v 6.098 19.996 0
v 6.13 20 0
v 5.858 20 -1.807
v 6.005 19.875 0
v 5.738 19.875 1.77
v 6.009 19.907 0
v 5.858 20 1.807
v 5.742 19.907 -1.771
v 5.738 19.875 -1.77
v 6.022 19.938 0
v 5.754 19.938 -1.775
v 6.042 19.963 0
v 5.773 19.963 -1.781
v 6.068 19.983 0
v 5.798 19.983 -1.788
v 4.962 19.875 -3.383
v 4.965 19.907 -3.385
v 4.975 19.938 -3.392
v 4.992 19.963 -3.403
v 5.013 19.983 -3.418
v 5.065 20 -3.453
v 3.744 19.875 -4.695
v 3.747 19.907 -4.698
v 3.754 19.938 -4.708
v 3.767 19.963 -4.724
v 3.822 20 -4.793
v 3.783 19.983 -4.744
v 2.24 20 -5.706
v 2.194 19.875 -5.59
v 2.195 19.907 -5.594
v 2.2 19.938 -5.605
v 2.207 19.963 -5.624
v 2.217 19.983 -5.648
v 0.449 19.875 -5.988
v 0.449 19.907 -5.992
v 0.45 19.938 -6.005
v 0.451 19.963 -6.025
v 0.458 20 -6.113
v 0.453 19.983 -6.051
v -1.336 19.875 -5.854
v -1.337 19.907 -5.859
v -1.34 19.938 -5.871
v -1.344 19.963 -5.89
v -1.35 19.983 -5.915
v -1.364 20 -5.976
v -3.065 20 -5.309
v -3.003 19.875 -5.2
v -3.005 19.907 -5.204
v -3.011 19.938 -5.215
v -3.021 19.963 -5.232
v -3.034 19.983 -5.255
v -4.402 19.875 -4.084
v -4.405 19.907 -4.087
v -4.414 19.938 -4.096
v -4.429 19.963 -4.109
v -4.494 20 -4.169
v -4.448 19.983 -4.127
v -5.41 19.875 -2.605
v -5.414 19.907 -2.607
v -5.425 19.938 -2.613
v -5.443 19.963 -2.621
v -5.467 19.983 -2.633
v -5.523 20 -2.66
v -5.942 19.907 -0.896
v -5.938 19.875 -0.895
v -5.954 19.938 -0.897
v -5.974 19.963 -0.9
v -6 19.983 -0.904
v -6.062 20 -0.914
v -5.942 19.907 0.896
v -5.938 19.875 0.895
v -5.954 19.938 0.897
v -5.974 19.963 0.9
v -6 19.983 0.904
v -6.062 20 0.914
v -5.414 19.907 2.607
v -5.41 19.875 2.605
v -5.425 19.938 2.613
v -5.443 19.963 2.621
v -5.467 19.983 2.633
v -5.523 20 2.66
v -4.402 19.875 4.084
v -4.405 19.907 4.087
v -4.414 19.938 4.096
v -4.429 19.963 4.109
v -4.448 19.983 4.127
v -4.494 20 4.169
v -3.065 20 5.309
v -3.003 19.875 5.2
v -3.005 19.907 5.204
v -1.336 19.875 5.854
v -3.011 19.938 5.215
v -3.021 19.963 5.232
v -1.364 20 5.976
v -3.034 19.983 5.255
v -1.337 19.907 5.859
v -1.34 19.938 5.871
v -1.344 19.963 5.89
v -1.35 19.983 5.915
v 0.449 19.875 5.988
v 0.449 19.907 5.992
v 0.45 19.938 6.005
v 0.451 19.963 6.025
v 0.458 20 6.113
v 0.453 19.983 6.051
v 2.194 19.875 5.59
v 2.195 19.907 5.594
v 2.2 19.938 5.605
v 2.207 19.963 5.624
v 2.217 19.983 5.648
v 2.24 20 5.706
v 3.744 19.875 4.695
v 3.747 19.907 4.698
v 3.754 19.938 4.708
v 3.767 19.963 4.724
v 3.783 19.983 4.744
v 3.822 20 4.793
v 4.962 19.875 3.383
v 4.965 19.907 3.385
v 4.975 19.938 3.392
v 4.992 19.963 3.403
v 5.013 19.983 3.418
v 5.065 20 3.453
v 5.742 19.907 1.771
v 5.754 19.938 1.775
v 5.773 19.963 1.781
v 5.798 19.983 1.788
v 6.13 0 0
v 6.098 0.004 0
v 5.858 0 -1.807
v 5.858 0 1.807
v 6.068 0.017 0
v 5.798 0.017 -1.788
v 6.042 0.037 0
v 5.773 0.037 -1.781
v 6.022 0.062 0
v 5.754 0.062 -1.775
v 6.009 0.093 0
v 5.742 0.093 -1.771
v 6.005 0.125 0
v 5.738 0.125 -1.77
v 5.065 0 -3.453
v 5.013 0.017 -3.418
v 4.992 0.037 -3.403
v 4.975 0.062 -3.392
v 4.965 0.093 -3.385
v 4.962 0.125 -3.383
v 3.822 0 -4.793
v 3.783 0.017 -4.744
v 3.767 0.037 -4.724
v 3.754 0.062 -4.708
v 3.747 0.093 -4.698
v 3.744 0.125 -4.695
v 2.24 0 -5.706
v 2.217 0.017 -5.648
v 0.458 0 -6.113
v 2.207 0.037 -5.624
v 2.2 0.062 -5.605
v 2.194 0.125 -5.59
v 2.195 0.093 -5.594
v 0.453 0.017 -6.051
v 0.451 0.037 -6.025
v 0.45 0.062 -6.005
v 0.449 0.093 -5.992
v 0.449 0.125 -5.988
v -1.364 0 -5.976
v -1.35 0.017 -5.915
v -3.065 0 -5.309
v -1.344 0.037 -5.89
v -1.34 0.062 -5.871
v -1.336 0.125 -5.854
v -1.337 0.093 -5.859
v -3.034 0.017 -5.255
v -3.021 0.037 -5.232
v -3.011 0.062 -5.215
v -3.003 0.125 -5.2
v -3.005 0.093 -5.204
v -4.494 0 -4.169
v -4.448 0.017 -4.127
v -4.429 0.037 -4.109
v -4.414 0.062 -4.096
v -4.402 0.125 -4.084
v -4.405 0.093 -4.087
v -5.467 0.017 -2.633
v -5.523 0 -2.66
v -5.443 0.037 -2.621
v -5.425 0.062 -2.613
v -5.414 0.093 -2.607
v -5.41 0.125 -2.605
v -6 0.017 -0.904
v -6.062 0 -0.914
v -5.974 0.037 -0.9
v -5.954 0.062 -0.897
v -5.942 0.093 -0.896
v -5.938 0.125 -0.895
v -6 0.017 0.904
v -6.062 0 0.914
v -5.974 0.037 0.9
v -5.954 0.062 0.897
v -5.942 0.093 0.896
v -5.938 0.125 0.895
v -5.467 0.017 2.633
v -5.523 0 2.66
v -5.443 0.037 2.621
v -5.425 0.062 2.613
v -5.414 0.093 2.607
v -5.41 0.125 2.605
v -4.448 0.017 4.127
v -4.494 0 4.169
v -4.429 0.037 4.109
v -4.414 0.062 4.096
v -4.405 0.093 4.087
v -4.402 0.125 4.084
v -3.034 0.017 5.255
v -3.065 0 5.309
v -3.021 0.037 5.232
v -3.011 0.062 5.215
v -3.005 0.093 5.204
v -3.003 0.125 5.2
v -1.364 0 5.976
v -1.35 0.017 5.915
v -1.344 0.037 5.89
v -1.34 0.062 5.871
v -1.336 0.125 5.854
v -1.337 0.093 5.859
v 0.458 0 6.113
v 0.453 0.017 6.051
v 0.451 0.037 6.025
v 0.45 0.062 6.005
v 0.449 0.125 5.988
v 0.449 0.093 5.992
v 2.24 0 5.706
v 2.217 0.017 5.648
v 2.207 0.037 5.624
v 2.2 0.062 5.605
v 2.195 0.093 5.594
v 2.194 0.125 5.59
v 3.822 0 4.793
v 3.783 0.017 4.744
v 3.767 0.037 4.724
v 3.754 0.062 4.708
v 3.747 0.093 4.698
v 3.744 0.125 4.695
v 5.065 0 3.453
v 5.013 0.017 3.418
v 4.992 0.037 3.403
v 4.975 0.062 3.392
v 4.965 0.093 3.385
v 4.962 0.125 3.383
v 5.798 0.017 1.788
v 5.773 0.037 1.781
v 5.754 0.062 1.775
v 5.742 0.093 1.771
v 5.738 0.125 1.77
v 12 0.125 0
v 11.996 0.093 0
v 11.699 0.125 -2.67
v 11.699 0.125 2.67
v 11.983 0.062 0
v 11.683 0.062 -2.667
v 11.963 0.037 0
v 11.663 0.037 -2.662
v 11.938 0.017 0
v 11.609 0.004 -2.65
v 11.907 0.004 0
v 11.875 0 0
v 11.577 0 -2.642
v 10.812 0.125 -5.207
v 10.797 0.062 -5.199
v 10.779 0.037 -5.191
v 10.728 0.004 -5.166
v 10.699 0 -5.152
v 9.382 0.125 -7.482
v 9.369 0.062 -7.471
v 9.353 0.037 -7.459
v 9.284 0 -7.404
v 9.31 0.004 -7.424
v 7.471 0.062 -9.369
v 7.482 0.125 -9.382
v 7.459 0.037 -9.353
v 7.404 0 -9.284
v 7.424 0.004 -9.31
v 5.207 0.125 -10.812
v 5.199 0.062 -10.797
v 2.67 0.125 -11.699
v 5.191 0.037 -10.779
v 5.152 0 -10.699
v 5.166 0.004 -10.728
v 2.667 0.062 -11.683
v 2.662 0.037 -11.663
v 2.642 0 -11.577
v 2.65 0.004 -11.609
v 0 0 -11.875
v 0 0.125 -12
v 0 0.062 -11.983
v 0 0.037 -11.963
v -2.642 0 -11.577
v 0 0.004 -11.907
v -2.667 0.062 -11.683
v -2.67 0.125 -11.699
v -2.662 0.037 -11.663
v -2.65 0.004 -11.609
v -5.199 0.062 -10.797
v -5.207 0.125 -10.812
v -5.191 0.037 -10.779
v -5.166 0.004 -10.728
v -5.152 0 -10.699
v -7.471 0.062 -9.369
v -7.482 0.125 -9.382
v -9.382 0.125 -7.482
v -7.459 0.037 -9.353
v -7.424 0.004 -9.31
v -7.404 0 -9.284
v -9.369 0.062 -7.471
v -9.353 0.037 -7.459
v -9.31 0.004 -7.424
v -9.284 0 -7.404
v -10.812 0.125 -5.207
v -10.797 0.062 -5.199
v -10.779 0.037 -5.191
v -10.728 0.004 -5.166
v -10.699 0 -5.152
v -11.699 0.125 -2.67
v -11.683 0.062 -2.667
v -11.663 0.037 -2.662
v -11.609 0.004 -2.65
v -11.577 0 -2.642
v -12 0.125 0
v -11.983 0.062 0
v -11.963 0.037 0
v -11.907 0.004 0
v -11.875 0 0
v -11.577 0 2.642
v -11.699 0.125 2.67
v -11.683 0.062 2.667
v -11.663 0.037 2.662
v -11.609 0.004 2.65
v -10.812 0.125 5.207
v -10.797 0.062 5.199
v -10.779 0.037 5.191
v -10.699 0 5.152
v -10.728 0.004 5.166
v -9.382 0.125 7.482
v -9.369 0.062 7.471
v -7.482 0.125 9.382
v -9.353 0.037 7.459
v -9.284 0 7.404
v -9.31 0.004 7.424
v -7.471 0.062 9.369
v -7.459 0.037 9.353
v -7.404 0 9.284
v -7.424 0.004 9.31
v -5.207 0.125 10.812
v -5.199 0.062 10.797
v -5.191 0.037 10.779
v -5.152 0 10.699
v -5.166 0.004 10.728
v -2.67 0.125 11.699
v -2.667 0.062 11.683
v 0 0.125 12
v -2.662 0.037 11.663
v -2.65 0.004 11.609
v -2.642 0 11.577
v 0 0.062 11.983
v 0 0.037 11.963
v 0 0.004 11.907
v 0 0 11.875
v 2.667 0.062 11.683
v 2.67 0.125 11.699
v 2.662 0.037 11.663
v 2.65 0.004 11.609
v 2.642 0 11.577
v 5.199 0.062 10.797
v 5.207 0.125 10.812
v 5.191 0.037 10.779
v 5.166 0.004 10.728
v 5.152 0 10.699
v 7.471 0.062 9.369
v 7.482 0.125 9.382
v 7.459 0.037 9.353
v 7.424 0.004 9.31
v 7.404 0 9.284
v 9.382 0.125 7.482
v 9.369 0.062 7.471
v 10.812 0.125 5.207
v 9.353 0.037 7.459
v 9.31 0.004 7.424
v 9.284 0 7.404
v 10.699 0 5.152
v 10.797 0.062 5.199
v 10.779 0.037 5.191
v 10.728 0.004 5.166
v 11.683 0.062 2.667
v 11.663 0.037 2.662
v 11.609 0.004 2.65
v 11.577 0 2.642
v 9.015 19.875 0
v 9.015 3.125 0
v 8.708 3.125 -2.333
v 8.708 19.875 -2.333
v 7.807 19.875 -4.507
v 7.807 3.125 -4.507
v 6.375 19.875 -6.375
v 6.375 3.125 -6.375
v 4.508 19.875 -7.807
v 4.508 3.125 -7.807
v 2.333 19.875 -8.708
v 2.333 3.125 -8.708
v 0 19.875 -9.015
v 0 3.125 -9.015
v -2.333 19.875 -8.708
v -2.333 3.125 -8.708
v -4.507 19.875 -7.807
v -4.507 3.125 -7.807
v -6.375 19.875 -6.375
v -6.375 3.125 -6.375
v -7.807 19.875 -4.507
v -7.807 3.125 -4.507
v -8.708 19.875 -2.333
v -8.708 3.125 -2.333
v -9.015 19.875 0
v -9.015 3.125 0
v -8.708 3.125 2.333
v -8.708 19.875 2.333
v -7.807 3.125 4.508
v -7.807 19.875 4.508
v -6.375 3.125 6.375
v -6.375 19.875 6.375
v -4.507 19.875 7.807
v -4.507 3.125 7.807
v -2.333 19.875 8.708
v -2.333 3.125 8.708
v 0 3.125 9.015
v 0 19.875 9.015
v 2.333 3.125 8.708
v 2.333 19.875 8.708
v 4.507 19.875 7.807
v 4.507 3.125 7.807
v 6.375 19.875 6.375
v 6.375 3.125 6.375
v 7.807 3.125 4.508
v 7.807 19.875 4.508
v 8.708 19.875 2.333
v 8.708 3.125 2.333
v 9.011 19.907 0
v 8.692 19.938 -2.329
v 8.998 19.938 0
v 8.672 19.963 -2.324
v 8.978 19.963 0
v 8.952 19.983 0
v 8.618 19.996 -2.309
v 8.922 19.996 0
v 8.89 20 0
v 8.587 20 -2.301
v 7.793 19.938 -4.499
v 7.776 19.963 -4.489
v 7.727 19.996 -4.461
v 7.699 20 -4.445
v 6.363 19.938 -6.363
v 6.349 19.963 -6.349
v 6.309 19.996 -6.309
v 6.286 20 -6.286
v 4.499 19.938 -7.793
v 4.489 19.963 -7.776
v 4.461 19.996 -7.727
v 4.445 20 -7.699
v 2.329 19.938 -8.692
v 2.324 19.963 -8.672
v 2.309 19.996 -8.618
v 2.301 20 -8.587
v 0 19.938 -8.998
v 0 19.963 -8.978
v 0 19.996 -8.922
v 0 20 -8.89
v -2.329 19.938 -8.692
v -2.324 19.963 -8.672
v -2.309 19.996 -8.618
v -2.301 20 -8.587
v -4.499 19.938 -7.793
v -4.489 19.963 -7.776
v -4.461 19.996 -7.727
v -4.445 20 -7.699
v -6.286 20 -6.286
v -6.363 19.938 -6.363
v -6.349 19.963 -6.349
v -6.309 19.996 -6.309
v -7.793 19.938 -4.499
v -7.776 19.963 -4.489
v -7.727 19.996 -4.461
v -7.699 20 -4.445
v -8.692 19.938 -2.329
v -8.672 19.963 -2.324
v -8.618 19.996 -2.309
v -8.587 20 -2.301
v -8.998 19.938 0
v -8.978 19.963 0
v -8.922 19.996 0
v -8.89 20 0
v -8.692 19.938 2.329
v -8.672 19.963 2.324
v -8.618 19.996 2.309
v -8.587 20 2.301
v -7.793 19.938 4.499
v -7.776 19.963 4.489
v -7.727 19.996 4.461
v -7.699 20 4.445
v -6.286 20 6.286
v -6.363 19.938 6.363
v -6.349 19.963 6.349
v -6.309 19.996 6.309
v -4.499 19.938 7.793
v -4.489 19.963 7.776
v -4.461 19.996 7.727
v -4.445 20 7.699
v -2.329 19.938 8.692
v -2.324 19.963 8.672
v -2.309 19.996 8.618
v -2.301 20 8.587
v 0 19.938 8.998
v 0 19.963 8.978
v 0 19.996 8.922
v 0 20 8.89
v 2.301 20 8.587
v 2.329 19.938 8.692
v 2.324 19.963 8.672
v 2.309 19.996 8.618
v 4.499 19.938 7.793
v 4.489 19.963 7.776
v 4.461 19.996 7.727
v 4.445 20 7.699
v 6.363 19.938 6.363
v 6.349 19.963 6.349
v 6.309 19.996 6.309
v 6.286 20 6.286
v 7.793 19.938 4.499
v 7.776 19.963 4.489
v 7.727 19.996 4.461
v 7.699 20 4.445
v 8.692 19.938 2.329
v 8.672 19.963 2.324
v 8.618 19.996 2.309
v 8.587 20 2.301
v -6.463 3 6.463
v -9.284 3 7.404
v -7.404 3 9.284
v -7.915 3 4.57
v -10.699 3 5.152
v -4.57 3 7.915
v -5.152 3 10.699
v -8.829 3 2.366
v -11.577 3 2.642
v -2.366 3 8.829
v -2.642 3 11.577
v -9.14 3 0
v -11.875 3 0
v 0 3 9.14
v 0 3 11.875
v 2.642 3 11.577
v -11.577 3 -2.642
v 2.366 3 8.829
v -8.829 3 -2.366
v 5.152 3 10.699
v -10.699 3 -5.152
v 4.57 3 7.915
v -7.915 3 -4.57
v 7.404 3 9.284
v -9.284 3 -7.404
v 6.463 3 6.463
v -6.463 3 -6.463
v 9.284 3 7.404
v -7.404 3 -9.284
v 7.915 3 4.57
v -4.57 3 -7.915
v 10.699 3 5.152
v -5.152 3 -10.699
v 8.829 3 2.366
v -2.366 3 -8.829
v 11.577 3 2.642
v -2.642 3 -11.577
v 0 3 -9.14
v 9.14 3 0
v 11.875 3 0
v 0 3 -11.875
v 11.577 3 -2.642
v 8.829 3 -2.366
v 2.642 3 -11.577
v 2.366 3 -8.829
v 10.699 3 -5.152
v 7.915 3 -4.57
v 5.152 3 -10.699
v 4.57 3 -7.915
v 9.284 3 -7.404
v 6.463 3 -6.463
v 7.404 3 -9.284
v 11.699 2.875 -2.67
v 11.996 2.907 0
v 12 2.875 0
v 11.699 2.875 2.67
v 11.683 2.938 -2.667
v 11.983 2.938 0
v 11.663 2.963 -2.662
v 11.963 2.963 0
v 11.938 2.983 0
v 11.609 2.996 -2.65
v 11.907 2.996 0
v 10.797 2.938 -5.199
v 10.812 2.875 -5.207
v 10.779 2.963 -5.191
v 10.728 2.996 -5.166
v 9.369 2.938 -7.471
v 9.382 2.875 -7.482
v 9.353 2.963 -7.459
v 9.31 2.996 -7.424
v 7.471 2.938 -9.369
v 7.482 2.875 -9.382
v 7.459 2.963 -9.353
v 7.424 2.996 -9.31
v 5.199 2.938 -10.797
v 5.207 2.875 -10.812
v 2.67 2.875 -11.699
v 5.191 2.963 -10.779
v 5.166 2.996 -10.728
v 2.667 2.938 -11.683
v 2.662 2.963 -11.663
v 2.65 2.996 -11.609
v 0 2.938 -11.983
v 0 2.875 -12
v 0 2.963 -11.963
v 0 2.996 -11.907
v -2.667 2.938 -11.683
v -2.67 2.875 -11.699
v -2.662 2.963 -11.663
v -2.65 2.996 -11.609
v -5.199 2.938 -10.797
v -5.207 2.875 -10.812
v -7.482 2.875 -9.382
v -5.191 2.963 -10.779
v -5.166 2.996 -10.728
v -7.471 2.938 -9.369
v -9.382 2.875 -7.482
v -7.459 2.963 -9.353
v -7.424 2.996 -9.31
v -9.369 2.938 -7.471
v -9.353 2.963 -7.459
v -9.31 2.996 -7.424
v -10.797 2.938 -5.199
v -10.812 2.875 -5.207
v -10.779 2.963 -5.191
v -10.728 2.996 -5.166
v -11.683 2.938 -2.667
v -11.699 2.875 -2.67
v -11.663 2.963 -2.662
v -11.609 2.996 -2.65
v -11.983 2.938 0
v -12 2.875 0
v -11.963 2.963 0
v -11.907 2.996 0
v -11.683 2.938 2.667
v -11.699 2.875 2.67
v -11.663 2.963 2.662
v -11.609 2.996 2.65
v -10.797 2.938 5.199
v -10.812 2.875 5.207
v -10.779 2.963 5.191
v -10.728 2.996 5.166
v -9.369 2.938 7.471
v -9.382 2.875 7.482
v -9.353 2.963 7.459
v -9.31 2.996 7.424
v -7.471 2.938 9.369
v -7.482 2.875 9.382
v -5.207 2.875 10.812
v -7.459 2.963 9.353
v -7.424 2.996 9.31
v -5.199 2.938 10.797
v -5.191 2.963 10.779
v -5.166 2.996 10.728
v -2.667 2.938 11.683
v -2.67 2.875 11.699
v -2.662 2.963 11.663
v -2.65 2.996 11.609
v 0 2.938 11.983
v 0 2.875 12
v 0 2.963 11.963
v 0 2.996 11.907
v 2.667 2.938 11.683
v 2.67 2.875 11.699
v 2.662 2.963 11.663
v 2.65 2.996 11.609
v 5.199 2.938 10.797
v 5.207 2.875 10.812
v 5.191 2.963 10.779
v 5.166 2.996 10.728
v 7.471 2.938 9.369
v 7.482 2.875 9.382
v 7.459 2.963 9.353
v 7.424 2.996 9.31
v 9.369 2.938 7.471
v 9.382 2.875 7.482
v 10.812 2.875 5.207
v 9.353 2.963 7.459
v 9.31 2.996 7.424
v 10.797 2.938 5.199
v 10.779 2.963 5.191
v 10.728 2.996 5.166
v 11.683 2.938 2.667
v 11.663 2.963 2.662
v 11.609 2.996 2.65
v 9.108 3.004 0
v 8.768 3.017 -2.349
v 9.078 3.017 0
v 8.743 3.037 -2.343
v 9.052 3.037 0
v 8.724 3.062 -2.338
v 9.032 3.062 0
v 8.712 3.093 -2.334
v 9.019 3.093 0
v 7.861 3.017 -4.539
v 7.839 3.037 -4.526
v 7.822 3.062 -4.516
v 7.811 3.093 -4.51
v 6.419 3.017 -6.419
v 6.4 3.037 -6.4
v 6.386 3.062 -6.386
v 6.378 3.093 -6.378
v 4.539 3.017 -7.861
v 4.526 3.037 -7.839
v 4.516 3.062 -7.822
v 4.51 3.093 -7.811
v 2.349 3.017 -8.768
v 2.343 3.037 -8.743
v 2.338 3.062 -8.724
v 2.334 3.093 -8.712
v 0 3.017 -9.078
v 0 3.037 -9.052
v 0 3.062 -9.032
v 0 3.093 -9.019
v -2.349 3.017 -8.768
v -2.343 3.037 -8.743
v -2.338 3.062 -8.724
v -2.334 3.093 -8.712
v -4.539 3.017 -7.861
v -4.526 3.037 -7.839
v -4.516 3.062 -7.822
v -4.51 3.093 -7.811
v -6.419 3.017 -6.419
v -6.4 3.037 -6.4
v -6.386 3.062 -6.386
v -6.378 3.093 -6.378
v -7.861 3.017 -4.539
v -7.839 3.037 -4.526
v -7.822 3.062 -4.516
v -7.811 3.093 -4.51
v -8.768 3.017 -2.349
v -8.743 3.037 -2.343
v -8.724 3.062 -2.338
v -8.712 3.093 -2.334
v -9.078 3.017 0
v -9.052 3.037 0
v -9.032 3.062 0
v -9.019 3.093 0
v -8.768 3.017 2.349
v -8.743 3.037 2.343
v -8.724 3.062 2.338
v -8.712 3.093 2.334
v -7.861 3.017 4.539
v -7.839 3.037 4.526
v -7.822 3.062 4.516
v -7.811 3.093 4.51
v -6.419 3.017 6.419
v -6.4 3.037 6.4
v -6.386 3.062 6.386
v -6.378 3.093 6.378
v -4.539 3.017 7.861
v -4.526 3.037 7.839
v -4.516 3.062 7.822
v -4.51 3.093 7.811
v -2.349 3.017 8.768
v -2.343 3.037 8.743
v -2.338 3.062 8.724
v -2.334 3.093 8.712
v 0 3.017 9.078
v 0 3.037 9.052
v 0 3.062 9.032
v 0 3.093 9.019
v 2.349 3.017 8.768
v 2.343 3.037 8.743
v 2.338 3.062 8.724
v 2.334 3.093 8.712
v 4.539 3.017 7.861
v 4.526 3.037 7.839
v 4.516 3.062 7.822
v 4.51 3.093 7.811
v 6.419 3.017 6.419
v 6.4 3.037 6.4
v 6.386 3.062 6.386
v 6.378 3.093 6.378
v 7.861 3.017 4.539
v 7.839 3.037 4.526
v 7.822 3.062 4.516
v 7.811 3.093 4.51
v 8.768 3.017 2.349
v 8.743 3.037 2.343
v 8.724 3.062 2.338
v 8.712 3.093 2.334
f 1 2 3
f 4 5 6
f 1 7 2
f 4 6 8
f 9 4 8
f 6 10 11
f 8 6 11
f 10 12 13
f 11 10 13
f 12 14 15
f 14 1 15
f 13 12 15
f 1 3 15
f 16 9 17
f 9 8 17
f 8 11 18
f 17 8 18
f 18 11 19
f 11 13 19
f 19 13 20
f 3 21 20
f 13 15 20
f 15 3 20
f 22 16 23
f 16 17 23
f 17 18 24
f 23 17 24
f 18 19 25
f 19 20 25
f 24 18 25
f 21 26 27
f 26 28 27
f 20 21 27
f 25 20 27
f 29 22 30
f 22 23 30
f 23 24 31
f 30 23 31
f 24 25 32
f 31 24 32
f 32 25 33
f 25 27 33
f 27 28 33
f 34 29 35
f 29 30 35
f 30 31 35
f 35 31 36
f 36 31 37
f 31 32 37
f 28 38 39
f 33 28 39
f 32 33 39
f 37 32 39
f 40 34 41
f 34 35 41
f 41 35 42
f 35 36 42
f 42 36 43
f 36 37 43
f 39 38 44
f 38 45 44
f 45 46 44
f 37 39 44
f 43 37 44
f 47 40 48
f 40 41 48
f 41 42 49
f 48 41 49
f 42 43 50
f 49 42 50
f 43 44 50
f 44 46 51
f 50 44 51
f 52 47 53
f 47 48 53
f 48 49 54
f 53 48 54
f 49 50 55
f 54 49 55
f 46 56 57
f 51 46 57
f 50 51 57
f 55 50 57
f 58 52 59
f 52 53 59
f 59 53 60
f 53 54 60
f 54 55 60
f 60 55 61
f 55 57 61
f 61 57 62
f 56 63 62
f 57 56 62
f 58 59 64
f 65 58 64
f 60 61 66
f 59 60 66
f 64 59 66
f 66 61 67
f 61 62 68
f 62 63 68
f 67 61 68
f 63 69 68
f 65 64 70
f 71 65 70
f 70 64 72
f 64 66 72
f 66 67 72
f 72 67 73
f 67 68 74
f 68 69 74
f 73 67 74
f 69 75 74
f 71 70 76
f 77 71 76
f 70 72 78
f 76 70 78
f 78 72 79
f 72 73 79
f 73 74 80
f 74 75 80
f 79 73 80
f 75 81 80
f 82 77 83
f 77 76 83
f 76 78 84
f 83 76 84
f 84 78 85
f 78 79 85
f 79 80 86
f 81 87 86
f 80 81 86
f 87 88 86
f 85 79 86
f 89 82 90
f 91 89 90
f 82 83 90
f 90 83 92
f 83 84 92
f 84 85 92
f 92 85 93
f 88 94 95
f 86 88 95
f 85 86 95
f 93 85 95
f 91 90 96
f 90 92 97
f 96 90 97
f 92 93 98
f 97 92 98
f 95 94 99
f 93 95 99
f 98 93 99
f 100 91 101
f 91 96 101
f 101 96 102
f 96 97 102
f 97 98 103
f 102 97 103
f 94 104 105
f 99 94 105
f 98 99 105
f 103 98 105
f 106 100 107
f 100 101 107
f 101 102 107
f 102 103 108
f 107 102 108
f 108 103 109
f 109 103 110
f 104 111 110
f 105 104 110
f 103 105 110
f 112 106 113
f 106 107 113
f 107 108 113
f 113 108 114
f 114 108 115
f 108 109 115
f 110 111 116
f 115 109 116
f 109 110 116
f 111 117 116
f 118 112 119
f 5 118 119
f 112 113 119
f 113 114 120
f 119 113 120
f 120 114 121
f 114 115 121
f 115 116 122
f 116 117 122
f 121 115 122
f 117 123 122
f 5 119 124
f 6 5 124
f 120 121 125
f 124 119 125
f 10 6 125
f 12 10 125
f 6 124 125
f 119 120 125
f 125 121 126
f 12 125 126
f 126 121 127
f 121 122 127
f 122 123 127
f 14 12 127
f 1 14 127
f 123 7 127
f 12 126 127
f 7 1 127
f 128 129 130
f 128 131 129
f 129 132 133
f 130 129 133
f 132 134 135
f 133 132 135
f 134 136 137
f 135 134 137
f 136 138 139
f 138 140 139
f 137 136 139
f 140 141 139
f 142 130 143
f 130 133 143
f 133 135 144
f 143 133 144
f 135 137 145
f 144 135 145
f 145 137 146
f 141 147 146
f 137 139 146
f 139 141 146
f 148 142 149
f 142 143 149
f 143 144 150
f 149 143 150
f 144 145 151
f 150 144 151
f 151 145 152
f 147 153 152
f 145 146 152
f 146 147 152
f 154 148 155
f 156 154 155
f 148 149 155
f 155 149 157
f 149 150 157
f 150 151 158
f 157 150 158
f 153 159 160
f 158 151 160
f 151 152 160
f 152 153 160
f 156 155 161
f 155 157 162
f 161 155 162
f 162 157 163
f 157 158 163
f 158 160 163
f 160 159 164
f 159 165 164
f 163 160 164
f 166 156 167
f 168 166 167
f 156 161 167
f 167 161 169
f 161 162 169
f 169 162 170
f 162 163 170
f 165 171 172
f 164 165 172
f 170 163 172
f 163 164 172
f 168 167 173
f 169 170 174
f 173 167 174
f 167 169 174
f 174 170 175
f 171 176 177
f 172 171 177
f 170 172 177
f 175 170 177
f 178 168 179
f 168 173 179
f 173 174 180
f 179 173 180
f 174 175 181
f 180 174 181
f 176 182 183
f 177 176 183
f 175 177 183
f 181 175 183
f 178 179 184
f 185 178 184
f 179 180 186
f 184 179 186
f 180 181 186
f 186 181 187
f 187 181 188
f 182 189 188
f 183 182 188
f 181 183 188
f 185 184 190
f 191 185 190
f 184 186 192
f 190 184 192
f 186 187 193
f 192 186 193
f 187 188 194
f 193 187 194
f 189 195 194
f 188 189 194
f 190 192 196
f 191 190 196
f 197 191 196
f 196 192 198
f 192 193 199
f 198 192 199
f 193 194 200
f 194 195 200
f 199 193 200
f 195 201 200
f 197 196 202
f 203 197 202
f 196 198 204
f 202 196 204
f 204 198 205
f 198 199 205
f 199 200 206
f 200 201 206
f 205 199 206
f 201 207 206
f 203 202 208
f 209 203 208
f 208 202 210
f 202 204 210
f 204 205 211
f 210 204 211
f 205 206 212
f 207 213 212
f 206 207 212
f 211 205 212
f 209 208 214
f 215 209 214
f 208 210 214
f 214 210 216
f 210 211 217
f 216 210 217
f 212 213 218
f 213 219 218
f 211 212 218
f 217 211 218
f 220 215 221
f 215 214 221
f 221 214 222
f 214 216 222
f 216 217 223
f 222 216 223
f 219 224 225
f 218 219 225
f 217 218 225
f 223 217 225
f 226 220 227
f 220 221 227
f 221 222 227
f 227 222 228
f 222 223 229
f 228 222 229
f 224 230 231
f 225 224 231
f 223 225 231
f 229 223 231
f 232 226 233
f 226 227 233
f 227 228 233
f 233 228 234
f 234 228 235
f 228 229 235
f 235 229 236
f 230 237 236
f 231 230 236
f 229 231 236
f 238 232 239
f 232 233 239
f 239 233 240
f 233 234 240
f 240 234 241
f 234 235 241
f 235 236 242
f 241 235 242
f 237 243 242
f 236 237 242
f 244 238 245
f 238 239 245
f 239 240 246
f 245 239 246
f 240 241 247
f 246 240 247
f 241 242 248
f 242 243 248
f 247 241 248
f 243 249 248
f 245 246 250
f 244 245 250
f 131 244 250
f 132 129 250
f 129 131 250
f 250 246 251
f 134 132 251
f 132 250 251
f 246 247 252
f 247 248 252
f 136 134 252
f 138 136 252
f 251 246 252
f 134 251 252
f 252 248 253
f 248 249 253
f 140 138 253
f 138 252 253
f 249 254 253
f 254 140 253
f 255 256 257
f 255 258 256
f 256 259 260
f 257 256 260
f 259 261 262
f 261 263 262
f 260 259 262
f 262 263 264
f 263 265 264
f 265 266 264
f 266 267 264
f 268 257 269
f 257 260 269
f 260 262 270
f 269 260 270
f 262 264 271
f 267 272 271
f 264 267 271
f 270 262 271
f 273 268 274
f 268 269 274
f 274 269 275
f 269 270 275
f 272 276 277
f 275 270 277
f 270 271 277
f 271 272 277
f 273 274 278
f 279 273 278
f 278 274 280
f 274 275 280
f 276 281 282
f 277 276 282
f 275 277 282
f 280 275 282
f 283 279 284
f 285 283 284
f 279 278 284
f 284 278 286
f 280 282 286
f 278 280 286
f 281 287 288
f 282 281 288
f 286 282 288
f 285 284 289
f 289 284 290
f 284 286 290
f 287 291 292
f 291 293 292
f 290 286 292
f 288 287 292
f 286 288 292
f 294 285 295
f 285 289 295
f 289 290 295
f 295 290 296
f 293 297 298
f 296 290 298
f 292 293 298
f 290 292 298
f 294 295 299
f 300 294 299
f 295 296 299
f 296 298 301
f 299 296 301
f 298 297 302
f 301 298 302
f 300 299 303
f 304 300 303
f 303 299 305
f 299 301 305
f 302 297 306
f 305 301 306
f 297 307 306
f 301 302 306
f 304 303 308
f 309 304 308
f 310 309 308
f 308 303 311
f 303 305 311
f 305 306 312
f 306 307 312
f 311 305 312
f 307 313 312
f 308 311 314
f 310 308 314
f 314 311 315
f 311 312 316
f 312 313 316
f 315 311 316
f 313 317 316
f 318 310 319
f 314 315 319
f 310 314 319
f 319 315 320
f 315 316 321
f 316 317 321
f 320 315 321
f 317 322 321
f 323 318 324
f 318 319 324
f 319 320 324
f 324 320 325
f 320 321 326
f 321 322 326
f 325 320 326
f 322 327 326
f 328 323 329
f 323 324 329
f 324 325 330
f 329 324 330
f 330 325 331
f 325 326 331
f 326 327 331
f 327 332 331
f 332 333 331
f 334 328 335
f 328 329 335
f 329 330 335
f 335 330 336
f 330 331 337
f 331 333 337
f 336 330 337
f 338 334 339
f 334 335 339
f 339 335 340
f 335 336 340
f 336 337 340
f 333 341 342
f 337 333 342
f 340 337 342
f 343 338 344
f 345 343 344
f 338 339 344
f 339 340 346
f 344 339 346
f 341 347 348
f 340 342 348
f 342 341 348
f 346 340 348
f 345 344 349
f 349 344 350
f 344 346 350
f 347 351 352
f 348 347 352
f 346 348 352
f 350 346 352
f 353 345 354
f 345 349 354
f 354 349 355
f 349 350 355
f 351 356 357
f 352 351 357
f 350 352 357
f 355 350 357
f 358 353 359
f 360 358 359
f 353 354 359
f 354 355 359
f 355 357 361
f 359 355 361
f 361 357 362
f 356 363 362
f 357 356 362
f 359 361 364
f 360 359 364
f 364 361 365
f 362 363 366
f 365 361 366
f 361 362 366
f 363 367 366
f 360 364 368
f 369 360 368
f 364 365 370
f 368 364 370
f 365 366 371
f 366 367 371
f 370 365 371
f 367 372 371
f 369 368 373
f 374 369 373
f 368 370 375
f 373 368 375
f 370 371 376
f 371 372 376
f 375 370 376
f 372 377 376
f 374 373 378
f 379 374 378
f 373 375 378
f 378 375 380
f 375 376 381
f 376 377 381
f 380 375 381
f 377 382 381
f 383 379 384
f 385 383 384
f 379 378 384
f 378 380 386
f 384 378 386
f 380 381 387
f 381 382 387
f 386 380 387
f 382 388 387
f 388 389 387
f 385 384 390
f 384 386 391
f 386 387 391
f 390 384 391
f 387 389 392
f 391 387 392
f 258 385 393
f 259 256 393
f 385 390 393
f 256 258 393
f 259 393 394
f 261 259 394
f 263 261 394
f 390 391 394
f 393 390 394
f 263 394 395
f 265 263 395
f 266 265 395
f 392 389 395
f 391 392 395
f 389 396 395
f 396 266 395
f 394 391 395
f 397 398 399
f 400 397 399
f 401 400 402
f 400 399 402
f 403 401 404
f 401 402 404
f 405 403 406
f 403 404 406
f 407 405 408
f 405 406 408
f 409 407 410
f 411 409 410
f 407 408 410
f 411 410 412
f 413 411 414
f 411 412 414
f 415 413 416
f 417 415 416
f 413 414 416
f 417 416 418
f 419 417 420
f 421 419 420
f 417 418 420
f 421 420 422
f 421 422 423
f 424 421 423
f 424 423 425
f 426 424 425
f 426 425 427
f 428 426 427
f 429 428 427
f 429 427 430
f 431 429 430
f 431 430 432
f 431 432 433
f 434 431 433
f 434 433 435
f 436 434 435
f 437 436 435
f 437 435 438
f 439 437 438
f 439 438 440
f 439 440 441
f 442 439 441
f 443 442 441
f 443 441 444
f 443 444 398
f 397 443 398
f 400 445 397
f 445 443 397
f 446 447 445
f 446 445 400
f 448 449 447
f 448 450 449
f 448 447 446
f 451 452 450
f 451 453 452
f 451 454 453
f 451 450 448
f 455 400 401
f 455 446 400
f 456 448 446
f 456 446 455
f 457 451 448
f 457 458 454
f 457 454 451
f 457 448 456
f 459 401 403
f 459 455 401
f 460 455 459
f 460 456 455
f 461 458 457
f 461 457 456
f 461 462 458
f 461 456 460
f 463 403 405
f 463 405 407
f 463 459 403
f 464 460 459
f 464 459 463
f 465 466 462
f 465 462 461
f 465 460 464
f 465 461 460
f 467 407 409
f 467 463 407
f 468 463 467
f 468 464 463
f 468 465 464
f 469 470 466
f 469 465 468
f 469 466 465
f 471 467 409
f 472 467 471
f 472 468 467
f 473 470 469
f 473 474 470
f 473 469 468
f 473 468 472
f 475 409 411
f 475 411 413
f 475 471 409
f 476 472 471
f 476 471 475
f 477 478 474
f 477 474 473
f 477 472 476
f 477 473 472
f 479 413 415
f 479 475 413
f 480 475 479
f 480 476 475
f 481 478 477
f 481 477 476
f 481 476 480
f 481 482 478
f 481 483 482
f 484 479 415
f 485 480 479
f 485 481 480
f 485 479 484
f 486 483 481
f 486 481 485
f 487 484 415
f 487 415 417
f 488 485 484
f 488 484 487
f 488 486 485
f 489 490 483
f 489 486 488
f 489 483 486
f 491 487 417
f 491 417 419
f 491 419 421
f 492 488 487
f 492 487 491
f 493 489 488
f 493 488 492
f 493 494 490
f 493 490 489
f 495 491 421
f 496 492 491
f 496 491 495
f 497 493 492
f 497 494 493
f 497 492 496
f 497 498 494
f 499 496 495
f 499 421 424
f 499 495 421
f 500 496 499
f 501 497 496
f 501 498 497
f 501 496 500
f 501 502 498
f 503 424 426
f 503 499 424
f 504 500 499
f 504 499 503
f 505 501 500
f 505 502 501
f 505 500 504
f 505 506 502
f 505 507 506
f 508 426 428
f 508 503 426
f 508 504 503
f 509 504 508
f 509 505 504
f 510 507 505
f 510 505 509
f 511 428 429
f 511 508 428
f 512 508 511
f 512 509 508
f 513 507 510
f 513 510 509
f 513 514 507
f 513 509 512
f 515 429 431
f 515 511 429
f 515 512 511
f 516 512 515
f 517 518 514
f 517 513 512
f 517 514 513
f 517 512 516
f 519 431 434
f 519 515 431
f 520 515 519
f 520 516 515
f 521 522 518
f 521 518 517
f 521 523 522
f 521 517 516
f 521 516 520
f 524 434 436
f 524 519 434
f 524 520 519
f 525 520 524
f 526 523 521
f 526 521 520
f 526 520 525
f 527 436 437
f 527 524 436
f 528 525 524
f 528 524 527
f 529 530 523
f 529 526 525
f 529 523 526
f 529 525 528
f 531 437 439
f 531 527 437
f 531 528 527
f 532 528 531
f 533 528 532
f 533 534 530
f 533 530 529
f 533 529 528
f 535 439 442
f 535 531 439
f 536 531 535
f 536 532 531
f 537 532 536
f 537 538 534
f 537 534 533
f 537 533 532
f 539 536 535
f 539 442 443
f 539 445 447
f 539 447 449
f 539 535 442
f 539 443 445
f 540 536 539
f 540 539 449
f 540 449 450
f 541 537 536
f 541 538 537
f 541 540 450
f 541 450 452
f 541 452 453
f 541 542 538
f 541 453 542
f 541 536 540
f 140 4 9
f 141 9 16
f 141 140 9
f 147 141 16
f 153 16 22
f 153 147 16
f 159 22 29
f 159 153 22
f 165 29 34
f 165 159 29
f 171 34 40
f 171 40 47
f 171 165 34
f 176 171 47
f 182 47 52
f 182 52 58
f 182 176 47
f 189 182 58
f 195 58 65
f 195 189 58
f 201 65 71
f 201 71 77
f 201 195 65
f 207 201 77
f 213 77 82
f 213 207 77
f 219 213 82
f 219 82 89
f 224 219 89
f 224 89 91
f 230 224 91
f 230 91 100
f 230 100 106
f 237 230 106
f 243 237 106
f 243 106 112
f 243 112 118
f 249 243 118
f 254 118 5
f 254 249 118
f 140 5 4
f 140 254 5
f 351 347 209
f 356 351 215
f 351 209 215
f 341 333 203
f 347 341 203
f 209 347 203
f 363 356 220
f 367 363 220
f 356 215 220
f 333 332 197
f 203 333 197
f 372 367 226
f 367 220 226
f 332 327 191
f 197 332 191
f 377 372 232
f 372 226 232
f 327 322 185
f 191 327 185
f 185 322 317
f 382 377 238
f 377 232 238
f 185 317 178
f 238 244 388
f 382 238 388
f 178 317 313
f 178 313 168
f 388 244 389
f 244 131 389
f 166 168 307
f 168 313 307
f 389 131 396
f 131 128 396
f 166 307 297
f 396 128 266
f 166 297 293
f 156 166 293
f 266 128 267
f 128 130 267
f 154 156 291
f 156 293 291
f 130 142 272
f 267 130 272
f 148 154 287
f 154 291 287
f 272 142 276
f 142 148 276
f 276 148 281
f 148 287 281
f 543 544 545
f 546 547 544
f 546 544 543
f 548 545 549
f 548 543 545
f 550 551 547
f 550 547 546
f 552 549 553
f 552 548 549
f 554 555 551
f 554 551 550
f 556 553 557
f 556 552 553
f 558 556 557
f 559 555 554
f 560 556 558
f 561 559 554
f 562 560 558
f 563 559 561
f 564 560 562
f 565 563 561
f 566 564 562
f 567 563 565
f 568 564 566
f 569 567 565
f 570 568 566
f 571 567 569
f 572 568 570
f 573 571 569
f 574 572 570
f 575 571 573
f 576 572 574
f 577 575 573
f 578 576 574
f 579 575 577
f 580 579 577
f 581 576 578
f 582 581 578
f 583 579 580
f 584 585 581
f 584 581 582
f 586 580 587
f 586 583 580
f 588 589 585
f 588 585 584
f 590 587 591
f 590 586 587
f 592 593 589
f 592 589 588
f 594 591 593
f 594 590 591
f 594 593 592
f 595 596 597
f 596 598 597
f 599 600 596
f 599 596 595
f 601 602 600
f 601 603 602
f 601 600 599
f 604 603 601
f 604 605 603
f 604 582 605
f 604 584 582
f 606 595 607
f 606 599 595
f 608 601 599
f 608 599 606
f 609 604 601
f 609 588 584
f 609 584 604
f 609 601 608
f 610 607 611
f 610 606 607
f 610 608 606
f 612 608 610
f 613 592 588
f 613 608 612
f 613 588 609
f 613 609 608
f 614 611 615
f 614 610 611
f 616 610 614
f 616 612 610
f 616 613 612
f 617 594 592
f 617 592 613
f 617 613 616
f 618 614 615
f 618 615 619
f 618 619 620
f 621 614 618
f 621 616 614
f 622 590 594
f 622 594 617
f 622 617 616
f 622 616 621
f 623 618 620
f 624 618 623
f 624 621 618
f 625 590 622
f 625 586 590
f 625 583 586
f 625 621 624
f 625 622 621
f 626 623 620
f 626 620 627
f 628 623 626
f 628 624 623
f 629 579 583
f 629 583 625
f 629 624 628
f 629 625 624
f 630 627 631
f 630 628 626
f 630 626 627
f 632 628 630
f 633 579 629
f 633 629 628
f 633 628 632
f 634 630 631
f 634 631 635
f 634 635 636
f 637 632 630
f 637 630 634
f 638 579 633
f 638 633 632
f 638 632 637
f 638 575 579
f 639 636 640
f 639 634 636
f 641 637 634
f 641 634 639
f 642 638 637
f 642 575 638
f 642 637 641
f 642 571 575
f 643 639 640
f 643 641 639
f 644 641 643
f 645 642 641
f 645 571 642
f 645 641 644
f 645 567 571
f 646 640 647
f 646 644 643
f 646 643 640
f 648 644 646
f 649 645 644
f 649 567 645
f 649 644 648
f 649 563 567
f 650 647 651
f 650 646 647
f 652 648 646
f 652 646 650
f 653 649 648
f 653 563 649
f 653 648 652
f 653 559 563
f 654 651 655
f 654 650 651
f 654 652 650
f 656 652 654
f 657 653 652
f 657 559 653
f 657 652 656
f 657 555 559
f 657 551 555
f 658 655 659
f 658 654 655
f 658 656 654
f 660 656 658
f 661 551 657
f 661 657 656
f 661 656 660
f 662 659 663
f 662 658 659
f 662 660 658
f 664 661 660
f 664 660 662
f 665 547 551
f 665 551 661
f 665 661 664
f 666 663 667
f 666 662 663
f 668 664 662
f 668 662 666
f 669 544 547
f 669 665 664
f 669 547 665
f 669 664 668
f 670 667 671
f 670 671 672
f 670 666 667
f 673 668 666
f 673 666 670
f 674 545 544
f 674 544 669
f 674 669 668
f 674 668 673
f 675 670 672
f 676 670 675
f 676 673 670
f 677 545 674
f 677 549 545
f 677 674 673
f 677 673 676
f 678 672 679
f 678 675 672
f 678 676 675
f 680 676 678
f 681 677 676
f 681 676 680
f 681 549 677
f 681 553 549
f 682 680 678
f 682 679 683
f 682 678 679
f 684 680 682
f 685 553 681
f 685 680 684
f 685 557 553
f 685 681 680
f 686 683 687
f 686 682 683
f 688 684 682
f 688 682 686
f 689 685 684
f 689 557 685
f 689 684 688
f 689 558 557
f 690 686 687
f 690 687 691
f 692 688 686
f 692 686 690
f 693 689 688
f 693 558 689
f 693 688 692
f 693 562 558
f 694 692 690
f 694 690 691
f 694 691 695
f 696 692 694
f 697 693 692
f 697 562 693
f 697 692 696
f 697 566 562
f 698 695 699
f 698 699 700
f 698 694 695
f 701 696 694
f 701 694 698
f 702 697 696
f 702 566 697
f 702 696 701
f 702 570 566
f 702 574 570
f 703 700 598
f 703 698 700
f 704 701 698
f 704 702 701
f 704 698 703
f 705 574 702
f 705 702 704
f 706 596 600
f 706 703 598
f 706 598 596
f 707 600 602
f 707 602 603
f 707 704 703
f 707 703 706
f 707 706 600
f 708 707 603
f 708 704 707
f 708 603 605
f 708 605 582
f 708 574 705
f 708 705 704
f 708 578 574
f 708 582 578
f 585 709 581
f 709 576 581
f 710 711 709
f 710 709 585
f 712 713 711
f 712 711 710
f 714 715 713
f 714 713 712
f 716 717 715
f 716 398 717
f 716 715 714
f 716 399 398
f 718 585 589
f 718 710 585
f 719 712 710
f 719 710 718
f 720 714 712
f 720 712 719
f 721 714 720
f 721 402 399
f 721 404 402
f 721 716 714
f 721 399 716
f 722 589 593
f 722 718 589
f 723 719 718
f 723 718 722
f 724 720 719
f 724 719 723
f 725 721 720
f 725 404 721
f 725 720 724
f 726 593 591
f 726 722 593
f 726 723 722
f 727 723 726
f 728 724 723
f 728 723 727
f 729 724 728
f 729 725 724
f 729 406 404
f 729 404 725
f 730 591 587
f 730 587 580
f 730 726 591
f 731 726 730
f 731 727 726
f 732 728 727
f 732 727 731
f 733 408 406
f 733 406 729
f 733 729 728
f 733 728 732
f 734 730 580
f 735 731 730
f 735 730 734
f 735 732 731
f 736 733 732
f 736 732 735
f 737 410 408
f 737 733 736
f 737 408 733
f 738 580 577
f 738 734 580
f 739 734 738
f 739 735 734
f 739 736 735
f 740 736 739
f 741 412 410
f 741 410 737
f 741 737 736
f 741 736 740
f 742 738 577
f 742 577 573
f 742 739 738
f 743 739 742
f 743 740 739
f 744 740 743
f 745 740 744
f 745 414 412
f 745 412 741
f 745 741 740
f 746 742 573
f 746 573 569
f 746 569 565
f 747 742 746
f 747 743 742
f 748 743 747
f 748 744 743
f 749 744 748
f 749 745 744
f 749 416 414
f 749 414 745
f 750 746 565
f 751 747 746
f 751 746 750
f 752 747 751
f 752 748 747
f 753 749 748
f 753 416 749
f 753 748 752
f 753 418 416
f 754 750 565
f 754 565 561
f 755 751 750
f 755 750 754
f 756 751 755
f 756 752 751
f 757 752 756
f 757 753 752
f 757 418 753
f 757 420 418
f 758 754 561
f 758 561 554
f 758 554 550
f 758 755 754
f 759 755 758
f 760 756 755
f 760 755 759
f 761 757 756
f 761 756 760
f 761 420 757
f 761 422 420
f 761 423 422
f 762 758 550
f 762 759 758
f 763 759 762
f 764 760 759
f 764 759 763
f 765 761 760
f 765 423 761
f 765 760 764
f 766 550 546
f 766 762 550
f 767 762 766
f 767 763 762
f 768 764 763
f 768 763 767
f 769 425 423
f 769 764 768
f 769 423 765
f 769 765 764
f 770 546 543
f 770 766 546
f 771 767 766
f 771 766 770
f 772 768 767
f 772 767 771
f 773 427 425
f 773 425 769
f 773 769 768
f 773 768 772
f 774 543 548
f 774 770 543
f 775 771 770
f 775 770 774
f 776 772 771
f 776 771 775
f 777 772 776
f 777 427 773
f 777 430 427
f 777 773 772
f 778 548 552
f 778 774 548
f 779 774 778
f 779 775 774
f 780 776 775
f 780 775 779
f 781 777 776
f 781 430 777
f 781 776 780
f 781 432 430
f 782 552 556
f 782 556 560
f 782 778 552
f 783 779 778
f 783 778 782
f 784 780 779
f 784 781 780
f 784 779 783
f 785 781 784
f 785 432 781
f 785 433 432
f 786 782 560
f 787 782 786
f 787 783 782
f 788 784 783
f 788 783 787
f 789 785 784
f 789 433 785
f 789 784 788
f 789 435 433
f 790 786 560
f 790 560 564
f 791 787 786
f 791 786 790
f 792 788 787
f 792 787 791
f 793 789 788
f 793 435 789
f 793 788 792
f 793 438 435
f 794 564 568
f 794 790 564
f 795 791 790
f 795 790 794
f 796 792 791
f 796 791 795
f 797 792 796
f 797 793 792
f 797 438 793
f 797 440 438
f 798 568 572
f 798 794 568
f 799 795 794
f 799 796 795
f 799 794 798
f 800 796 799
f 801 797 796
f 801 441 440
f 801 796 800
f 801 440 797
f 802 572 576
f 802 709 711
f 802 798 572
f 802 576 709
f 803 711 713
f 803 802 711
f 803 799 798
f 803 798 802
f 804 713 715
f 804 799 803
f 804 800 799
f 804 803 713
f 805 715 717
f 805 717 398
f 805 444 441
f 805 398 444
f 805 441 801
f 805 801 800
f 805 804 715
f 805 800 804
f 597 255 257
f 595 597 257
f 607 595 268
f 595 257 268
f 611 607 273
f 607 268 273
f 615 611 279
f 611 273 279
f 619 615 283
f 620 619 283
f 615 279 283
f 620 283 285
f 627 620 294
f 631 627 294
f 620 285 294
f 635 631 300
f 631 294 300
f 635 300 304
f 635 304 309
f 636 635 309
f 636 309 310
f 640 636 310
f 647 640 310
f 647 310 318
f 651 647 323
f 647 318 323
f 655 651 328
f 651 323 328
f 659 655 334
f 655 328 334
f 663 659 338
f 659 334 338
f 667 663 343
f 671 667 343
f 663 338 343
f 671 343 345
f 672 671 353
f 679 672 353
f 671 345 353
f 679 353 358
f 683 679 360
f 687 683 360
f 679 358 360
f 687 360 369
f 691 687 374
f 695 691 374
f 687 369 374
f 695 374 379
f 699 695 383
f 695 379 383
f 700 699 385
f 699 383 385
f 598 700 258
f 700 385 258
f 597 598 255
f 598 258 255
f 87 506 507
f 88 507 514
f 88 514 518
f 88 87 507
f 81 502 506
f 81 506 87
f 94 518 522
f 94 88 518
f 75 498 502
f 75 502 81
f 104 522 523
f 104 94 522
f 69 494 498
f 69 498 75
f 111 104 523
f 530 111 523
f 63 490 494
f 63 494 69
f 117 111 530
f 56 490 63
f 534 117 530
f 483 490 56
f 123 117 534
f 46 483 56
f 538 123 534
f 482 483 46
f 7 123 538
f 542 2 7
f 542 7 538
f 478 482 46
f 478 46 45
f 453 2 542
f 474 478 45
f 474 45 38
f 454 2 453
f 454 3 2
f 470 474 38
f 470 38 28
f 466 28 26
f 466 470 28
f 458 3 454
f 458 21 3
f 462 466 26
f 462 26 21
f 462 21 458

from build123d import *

# Parameters (mm, degrees)
SKETCH3_R           = 9.015
SKETCH3_R_2         = 6.005
BOSS_EXTRUDE1_DEPTH = 20
SKETCH4_R           = 12
SKETCH4_R_2         = 9.015
BOSS_EXTRUDE2_DEPTH = 3
FILLET1_R           = 0.125


with BuildPart() as part:
    # Sketch3 → Boss-Extrude1 (new body)
    with BuildSketch(Plane(origin=(0, 0, 0), x_dir=(1, 0, 0), z_dir=(0, 1, 0))):
        Circle(SKETCH3_R)
        Circle(SKETCH3_R_2, mode=Mode.SUBTRACT)
    extrude(amount=BOSS_EXTRUDE1_DEPTH)

    # Sketch4 → Boss-Extrude2 (add)
    with BuildSketch(Plane(origin=(0, 0, 0), x_dir=(1, 0, 0), z_dir=(0, 1, 0))):
        Circle(SKETCH4_R)
        Circle(SKETCH4_R_2, mode=Mode.SUBTRACT)
    extrude(amount=BOSS_EXTRUDE2_DEPTH)

    # Fillet1
    fillet1_edges = [part.edges().sort_by_distance(p)[0] for p in [
        (-12, 0, 0),
        (-9.015, 3, 0),
        (-9.015, 20, 0),
        (-6.005, 0, 0),
        (-6.005, 20, 0),
        (-12, 3, 0),
    ]]
    fillet(fillet1_edges, radius=FILLET1_R)


solid = part.part
